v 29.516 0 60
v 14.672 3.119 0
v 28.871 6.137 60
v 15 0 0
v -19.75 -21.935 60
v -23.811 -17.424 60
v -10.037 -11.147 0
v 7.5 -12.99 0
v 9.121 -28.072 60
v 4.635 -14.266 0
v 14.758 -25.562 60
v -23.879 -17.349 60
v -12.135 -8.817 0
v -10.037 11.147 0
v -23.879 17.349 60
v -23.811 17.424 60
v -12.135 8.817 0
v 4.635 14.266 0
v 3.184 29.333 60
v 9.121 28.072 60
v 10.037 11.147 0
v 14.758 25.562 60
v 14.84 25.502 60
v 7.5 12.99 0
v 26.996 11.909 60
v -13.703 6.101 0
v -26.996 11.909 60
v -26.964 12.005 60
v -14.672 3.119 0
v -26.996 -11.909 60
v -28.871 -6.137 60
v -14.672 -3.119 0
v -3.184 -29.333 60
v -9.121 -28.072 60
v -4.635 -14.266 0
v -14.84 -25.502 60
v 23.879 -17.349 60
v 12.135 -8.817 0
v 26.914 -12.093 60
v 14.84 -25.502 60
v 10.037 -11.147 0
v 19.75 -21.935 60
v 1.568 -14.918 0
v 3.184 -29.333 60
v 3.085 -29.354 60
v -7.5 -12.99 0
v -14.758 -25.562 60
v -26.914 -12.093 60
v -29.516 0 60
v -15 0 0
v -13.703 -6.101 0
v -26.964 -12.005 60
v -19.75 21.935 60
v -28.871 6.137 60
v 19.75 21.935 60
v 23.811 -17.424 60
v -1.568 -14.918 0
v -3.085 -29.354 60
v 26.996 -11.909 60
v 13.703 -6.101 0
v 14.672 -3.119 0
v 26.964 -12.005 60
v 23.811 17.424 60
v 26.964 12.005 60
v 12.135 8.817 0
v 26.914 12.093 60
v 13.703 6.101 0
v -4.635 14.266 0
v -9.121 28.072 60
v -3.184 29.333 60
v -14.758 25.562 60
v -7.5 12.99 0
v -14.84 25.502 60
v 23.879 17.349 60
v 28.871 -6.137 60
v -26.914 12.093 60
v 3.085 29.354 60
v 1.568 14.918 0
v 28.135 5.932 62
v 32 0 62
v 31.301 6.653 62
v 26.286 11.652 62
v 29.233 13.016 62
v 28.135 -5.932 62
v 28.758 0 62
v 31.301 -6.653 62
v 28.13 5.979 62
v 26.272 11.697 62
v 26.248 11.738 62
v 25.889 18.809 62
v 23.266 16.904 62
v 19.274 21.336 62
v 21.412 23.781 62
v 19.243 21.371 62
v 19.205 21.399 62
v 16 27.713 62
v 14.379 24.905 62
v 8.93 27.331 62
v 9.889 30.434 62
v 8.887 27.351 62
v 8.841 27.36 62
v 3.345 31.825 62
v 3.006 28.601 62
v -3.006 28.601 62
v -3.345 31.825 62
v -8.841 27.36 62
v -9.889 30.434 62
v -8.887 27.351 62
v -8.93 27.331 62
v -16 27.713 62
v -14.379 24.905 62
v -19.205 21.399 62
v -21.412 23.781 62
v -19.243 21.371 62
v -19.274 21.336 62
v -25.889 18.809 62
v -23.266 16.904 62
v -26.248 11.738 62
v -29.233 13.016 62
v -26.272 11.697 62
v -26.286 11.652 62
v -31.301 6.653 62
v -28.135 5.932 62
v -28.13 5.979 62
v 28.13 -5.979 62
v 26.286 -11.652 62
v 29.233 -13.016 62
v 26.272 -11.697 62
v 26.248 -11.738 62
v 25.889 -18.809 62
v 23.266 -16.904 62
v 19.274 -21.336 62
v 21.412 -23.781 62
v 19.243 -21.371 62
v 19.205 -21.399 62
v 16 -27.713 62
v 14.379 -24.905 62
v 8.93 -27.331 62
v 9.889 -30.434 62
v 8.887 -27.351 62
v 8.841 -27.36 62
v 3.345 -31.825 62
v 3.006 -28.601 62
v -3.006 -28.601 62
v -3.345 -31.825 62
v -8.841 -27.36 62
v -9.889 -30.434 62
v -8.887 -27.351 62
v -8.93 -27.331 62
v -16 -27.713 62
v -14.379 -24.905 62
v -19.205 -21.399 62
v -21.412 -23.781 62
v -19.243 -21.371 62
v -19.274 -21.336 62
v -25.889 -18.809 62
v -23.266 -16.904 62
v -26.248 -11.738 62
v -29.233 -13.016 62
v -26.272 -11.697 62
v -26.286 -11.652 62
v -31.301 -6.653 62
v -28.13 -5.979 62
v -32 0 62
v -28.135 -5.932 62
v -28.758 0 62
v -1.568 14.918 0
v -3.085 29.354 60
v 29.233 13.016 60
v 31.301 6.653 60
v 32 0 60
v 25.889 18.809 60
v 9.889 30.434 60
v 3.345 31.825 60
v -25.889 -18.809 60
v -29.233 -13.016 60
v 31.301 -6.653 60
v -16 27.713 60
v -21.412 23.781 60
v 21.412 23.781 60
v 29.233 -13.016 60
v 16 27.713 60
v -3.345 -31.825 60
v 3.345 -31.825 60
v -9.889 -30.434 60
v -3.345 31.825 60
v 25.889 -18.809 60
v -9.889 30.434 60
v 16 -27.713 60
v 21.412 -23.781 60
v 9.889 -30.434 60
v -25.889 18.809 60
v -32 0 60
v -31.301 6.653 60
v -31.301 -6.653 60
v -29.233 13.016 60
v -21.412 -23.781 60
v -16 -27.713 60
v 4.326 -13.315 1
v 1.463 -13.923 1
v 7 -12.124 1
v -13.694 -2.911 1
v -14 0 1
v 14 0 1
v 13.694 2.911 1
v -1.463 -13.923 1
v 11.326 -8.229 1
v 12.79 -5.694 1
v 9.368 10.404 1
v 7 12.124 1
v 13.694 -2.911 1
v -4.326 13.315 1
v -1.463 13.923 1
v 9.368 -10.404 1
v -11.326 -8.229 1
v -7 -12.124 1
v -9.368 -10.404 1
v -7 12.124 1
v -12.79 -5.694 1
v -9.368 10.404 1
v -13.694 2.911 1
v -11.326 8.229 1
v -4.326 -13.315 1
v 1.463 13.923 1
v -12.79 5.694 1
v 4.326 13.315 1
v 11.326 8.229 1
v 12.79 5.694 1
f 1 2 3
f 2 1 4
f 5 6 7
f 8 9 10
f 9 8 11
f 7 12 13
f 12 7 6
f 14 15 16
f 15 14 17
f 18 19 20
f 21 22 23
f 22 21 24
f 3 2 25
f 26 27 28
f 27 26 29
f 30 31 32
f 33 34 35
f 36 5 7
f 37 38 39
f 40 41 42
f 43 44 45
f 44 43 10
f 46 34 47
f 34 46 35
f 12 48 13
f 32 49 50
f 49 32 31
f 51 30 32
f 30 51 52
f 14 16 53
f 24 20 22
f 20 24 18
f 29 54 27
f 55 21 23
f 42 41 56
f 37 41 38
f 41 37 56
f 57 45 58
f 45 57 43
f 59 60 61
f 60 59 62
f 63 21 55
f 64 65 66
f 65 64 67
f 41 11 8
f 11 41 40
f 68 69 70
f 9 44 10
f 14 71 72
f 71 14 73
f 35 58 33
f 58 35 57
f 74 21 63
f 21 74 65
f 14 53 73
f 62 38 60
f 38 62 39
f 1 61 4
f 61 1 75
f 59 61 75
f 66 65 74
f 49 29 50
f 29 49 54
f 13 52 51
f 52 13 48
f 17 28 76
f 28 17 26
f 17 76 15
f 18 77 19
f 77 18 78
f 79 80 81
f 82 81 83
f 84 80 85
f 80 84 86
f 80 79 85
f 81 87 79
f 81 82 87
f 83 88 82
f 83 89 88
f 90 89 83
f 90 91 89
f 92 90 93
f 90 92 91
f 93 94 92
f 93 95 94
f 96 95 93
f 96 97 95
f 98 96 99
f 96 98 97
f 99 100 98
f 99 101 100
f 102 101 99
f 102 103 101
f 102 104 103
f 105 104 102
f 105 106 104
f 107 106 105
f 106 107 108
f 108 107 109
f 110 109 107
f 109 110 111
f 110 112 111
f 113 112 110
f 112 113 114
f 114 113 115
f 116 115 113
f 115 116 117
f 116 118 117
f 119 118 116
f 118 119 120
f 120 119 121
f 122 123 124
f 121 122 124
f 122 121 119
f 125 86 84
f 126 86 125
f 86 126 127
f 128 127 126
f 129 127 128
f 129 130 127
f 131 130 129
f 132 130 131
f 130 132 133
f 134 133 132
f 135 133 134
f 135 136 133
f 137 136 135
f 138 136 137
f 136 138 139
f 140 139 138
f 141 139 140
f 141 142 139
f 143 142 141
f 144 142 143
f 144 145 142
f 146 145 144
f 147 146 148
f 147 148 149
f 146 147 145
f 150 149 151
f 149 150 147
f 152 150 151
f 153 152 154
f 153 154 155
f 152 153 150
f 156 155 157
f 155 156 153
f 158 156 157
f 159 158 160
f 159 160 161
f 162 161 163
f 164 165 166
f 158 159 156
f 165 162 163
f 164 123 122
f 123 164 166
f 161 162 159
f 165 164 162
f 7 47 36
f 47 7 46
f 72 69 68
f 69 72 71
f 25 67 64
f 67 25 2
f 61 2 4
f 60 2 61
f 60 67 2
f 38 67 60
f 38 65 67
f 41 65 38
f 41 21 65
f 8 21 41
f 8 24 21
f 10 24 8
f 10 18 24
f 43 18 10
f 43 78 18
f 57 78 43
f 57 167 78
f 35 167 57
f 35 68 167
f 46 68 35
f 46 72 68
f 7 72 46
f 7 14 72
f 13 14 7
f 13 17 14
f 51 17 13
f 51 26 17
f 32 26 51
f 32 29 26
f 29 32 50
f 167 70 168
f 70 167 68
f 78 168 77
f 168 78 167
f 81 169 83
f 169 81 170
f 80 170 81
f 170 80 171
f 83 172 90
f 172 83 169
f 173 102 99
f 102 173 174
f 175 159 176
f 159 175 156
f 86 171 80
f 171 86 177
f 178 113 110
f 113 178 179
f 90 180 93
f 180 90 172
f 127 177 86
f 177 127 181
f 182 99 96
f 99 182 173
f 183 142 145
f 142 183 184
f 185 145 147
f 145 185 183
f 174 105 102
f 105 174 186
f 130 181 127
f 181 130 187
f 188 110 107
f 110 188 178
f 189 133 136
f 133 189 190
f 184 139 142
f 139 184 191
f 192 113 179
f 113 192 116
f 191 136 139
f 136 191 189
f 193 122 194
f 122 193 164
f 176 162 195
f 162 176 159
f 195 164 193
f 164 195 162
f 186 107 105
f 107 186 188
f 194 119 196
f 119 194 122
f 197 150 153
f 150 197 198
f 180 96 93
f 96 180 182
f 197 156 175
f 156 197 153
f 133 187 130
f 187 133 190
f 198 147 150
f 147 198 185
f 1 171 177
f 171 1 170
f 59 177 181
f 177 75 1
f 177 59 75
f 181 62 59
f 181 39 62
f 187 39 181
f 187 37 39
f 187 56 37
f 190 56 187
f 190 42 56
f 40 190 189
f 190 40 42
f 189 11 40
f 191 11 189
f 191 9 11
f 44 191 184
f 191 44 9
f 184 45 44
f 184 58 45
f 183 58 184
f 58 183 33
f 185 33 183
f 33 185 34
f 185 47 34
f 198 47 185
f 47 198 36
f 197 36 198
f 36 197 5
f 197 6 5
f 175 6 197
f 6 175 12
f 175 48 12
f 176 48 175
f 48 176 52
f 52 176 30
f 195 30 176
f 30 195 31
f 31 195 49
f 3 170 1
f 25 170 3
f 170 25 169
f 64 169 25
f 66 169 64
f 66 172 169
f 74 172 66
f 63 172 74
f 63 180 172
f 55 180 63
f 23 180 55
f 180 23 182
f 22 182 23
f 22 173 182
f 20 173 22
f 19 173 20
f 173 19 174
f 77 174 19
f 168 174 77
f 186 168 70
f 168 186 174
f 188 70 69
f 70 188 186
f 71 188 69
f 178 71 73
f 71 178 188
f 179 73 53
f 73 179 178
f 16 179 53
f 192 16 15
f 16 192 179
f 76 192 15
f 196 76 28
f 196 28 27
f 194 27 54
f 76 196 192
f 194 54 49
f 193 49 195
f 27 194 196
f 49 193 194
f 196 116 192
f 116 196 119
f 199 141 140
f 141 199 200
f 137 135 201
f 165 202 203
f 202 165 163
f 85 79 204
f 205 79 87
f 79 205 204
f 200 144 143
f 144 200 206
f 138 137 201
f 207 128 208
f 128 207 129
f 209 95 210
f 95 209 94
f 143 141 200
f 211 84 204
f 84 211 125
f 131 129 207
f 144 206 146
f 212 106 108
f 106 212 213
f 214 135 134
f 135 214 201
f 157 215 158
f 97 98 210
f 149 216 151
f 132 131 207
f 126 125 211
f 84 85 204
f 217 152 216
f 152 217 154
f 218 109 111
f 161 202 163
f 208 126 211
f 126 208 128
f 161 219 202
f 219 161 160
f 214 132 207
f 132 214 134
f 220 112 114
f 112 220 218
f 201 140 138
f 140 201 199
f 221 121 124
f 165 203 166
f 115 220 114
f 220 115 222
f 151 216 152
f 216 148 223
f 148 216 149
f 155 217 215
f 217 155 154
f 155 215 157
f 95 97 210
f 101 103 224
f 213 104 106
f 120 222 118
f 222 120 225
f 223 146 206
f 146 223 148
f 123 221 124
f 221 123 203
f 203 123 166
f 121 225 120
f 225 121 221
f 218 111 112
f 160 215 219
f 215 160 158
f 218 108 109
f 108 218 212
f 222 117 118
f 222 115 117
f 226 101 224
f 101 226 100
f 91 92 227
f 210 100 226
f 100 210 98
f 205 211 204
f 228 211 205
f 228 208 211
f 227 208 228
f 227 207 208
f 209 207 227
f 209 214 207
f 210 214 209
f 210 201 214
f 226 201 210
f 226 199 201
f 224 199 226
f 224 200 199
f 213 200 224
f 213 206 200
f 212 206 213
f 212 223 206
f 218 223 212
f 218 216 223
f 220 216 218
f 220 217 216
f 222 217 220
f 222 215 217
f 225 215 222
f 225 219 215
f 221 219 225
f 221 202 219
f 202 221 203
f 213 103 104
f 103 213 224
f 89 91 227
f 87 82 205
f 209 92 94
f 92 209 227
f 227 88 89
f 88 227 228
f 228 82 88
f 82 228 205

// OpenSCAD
module pahar_plastic()
{
    
   //difference(){
    
   // color("brown") translate([0,0,60])cylinder(h=2,r=29);    
   //     }
    
  
   difference(){
       union(){
    color("brown") cylinder(h=62, r1 = 15, r2=30); 
    color("brown") translate([0,0,60])cylinder(h=2,r=32);
       }
       color("brown") translate([0,0,1]) cylinder(h=62, r1 = 14, r2=29);
   }
}
 
pahar_plastic();
